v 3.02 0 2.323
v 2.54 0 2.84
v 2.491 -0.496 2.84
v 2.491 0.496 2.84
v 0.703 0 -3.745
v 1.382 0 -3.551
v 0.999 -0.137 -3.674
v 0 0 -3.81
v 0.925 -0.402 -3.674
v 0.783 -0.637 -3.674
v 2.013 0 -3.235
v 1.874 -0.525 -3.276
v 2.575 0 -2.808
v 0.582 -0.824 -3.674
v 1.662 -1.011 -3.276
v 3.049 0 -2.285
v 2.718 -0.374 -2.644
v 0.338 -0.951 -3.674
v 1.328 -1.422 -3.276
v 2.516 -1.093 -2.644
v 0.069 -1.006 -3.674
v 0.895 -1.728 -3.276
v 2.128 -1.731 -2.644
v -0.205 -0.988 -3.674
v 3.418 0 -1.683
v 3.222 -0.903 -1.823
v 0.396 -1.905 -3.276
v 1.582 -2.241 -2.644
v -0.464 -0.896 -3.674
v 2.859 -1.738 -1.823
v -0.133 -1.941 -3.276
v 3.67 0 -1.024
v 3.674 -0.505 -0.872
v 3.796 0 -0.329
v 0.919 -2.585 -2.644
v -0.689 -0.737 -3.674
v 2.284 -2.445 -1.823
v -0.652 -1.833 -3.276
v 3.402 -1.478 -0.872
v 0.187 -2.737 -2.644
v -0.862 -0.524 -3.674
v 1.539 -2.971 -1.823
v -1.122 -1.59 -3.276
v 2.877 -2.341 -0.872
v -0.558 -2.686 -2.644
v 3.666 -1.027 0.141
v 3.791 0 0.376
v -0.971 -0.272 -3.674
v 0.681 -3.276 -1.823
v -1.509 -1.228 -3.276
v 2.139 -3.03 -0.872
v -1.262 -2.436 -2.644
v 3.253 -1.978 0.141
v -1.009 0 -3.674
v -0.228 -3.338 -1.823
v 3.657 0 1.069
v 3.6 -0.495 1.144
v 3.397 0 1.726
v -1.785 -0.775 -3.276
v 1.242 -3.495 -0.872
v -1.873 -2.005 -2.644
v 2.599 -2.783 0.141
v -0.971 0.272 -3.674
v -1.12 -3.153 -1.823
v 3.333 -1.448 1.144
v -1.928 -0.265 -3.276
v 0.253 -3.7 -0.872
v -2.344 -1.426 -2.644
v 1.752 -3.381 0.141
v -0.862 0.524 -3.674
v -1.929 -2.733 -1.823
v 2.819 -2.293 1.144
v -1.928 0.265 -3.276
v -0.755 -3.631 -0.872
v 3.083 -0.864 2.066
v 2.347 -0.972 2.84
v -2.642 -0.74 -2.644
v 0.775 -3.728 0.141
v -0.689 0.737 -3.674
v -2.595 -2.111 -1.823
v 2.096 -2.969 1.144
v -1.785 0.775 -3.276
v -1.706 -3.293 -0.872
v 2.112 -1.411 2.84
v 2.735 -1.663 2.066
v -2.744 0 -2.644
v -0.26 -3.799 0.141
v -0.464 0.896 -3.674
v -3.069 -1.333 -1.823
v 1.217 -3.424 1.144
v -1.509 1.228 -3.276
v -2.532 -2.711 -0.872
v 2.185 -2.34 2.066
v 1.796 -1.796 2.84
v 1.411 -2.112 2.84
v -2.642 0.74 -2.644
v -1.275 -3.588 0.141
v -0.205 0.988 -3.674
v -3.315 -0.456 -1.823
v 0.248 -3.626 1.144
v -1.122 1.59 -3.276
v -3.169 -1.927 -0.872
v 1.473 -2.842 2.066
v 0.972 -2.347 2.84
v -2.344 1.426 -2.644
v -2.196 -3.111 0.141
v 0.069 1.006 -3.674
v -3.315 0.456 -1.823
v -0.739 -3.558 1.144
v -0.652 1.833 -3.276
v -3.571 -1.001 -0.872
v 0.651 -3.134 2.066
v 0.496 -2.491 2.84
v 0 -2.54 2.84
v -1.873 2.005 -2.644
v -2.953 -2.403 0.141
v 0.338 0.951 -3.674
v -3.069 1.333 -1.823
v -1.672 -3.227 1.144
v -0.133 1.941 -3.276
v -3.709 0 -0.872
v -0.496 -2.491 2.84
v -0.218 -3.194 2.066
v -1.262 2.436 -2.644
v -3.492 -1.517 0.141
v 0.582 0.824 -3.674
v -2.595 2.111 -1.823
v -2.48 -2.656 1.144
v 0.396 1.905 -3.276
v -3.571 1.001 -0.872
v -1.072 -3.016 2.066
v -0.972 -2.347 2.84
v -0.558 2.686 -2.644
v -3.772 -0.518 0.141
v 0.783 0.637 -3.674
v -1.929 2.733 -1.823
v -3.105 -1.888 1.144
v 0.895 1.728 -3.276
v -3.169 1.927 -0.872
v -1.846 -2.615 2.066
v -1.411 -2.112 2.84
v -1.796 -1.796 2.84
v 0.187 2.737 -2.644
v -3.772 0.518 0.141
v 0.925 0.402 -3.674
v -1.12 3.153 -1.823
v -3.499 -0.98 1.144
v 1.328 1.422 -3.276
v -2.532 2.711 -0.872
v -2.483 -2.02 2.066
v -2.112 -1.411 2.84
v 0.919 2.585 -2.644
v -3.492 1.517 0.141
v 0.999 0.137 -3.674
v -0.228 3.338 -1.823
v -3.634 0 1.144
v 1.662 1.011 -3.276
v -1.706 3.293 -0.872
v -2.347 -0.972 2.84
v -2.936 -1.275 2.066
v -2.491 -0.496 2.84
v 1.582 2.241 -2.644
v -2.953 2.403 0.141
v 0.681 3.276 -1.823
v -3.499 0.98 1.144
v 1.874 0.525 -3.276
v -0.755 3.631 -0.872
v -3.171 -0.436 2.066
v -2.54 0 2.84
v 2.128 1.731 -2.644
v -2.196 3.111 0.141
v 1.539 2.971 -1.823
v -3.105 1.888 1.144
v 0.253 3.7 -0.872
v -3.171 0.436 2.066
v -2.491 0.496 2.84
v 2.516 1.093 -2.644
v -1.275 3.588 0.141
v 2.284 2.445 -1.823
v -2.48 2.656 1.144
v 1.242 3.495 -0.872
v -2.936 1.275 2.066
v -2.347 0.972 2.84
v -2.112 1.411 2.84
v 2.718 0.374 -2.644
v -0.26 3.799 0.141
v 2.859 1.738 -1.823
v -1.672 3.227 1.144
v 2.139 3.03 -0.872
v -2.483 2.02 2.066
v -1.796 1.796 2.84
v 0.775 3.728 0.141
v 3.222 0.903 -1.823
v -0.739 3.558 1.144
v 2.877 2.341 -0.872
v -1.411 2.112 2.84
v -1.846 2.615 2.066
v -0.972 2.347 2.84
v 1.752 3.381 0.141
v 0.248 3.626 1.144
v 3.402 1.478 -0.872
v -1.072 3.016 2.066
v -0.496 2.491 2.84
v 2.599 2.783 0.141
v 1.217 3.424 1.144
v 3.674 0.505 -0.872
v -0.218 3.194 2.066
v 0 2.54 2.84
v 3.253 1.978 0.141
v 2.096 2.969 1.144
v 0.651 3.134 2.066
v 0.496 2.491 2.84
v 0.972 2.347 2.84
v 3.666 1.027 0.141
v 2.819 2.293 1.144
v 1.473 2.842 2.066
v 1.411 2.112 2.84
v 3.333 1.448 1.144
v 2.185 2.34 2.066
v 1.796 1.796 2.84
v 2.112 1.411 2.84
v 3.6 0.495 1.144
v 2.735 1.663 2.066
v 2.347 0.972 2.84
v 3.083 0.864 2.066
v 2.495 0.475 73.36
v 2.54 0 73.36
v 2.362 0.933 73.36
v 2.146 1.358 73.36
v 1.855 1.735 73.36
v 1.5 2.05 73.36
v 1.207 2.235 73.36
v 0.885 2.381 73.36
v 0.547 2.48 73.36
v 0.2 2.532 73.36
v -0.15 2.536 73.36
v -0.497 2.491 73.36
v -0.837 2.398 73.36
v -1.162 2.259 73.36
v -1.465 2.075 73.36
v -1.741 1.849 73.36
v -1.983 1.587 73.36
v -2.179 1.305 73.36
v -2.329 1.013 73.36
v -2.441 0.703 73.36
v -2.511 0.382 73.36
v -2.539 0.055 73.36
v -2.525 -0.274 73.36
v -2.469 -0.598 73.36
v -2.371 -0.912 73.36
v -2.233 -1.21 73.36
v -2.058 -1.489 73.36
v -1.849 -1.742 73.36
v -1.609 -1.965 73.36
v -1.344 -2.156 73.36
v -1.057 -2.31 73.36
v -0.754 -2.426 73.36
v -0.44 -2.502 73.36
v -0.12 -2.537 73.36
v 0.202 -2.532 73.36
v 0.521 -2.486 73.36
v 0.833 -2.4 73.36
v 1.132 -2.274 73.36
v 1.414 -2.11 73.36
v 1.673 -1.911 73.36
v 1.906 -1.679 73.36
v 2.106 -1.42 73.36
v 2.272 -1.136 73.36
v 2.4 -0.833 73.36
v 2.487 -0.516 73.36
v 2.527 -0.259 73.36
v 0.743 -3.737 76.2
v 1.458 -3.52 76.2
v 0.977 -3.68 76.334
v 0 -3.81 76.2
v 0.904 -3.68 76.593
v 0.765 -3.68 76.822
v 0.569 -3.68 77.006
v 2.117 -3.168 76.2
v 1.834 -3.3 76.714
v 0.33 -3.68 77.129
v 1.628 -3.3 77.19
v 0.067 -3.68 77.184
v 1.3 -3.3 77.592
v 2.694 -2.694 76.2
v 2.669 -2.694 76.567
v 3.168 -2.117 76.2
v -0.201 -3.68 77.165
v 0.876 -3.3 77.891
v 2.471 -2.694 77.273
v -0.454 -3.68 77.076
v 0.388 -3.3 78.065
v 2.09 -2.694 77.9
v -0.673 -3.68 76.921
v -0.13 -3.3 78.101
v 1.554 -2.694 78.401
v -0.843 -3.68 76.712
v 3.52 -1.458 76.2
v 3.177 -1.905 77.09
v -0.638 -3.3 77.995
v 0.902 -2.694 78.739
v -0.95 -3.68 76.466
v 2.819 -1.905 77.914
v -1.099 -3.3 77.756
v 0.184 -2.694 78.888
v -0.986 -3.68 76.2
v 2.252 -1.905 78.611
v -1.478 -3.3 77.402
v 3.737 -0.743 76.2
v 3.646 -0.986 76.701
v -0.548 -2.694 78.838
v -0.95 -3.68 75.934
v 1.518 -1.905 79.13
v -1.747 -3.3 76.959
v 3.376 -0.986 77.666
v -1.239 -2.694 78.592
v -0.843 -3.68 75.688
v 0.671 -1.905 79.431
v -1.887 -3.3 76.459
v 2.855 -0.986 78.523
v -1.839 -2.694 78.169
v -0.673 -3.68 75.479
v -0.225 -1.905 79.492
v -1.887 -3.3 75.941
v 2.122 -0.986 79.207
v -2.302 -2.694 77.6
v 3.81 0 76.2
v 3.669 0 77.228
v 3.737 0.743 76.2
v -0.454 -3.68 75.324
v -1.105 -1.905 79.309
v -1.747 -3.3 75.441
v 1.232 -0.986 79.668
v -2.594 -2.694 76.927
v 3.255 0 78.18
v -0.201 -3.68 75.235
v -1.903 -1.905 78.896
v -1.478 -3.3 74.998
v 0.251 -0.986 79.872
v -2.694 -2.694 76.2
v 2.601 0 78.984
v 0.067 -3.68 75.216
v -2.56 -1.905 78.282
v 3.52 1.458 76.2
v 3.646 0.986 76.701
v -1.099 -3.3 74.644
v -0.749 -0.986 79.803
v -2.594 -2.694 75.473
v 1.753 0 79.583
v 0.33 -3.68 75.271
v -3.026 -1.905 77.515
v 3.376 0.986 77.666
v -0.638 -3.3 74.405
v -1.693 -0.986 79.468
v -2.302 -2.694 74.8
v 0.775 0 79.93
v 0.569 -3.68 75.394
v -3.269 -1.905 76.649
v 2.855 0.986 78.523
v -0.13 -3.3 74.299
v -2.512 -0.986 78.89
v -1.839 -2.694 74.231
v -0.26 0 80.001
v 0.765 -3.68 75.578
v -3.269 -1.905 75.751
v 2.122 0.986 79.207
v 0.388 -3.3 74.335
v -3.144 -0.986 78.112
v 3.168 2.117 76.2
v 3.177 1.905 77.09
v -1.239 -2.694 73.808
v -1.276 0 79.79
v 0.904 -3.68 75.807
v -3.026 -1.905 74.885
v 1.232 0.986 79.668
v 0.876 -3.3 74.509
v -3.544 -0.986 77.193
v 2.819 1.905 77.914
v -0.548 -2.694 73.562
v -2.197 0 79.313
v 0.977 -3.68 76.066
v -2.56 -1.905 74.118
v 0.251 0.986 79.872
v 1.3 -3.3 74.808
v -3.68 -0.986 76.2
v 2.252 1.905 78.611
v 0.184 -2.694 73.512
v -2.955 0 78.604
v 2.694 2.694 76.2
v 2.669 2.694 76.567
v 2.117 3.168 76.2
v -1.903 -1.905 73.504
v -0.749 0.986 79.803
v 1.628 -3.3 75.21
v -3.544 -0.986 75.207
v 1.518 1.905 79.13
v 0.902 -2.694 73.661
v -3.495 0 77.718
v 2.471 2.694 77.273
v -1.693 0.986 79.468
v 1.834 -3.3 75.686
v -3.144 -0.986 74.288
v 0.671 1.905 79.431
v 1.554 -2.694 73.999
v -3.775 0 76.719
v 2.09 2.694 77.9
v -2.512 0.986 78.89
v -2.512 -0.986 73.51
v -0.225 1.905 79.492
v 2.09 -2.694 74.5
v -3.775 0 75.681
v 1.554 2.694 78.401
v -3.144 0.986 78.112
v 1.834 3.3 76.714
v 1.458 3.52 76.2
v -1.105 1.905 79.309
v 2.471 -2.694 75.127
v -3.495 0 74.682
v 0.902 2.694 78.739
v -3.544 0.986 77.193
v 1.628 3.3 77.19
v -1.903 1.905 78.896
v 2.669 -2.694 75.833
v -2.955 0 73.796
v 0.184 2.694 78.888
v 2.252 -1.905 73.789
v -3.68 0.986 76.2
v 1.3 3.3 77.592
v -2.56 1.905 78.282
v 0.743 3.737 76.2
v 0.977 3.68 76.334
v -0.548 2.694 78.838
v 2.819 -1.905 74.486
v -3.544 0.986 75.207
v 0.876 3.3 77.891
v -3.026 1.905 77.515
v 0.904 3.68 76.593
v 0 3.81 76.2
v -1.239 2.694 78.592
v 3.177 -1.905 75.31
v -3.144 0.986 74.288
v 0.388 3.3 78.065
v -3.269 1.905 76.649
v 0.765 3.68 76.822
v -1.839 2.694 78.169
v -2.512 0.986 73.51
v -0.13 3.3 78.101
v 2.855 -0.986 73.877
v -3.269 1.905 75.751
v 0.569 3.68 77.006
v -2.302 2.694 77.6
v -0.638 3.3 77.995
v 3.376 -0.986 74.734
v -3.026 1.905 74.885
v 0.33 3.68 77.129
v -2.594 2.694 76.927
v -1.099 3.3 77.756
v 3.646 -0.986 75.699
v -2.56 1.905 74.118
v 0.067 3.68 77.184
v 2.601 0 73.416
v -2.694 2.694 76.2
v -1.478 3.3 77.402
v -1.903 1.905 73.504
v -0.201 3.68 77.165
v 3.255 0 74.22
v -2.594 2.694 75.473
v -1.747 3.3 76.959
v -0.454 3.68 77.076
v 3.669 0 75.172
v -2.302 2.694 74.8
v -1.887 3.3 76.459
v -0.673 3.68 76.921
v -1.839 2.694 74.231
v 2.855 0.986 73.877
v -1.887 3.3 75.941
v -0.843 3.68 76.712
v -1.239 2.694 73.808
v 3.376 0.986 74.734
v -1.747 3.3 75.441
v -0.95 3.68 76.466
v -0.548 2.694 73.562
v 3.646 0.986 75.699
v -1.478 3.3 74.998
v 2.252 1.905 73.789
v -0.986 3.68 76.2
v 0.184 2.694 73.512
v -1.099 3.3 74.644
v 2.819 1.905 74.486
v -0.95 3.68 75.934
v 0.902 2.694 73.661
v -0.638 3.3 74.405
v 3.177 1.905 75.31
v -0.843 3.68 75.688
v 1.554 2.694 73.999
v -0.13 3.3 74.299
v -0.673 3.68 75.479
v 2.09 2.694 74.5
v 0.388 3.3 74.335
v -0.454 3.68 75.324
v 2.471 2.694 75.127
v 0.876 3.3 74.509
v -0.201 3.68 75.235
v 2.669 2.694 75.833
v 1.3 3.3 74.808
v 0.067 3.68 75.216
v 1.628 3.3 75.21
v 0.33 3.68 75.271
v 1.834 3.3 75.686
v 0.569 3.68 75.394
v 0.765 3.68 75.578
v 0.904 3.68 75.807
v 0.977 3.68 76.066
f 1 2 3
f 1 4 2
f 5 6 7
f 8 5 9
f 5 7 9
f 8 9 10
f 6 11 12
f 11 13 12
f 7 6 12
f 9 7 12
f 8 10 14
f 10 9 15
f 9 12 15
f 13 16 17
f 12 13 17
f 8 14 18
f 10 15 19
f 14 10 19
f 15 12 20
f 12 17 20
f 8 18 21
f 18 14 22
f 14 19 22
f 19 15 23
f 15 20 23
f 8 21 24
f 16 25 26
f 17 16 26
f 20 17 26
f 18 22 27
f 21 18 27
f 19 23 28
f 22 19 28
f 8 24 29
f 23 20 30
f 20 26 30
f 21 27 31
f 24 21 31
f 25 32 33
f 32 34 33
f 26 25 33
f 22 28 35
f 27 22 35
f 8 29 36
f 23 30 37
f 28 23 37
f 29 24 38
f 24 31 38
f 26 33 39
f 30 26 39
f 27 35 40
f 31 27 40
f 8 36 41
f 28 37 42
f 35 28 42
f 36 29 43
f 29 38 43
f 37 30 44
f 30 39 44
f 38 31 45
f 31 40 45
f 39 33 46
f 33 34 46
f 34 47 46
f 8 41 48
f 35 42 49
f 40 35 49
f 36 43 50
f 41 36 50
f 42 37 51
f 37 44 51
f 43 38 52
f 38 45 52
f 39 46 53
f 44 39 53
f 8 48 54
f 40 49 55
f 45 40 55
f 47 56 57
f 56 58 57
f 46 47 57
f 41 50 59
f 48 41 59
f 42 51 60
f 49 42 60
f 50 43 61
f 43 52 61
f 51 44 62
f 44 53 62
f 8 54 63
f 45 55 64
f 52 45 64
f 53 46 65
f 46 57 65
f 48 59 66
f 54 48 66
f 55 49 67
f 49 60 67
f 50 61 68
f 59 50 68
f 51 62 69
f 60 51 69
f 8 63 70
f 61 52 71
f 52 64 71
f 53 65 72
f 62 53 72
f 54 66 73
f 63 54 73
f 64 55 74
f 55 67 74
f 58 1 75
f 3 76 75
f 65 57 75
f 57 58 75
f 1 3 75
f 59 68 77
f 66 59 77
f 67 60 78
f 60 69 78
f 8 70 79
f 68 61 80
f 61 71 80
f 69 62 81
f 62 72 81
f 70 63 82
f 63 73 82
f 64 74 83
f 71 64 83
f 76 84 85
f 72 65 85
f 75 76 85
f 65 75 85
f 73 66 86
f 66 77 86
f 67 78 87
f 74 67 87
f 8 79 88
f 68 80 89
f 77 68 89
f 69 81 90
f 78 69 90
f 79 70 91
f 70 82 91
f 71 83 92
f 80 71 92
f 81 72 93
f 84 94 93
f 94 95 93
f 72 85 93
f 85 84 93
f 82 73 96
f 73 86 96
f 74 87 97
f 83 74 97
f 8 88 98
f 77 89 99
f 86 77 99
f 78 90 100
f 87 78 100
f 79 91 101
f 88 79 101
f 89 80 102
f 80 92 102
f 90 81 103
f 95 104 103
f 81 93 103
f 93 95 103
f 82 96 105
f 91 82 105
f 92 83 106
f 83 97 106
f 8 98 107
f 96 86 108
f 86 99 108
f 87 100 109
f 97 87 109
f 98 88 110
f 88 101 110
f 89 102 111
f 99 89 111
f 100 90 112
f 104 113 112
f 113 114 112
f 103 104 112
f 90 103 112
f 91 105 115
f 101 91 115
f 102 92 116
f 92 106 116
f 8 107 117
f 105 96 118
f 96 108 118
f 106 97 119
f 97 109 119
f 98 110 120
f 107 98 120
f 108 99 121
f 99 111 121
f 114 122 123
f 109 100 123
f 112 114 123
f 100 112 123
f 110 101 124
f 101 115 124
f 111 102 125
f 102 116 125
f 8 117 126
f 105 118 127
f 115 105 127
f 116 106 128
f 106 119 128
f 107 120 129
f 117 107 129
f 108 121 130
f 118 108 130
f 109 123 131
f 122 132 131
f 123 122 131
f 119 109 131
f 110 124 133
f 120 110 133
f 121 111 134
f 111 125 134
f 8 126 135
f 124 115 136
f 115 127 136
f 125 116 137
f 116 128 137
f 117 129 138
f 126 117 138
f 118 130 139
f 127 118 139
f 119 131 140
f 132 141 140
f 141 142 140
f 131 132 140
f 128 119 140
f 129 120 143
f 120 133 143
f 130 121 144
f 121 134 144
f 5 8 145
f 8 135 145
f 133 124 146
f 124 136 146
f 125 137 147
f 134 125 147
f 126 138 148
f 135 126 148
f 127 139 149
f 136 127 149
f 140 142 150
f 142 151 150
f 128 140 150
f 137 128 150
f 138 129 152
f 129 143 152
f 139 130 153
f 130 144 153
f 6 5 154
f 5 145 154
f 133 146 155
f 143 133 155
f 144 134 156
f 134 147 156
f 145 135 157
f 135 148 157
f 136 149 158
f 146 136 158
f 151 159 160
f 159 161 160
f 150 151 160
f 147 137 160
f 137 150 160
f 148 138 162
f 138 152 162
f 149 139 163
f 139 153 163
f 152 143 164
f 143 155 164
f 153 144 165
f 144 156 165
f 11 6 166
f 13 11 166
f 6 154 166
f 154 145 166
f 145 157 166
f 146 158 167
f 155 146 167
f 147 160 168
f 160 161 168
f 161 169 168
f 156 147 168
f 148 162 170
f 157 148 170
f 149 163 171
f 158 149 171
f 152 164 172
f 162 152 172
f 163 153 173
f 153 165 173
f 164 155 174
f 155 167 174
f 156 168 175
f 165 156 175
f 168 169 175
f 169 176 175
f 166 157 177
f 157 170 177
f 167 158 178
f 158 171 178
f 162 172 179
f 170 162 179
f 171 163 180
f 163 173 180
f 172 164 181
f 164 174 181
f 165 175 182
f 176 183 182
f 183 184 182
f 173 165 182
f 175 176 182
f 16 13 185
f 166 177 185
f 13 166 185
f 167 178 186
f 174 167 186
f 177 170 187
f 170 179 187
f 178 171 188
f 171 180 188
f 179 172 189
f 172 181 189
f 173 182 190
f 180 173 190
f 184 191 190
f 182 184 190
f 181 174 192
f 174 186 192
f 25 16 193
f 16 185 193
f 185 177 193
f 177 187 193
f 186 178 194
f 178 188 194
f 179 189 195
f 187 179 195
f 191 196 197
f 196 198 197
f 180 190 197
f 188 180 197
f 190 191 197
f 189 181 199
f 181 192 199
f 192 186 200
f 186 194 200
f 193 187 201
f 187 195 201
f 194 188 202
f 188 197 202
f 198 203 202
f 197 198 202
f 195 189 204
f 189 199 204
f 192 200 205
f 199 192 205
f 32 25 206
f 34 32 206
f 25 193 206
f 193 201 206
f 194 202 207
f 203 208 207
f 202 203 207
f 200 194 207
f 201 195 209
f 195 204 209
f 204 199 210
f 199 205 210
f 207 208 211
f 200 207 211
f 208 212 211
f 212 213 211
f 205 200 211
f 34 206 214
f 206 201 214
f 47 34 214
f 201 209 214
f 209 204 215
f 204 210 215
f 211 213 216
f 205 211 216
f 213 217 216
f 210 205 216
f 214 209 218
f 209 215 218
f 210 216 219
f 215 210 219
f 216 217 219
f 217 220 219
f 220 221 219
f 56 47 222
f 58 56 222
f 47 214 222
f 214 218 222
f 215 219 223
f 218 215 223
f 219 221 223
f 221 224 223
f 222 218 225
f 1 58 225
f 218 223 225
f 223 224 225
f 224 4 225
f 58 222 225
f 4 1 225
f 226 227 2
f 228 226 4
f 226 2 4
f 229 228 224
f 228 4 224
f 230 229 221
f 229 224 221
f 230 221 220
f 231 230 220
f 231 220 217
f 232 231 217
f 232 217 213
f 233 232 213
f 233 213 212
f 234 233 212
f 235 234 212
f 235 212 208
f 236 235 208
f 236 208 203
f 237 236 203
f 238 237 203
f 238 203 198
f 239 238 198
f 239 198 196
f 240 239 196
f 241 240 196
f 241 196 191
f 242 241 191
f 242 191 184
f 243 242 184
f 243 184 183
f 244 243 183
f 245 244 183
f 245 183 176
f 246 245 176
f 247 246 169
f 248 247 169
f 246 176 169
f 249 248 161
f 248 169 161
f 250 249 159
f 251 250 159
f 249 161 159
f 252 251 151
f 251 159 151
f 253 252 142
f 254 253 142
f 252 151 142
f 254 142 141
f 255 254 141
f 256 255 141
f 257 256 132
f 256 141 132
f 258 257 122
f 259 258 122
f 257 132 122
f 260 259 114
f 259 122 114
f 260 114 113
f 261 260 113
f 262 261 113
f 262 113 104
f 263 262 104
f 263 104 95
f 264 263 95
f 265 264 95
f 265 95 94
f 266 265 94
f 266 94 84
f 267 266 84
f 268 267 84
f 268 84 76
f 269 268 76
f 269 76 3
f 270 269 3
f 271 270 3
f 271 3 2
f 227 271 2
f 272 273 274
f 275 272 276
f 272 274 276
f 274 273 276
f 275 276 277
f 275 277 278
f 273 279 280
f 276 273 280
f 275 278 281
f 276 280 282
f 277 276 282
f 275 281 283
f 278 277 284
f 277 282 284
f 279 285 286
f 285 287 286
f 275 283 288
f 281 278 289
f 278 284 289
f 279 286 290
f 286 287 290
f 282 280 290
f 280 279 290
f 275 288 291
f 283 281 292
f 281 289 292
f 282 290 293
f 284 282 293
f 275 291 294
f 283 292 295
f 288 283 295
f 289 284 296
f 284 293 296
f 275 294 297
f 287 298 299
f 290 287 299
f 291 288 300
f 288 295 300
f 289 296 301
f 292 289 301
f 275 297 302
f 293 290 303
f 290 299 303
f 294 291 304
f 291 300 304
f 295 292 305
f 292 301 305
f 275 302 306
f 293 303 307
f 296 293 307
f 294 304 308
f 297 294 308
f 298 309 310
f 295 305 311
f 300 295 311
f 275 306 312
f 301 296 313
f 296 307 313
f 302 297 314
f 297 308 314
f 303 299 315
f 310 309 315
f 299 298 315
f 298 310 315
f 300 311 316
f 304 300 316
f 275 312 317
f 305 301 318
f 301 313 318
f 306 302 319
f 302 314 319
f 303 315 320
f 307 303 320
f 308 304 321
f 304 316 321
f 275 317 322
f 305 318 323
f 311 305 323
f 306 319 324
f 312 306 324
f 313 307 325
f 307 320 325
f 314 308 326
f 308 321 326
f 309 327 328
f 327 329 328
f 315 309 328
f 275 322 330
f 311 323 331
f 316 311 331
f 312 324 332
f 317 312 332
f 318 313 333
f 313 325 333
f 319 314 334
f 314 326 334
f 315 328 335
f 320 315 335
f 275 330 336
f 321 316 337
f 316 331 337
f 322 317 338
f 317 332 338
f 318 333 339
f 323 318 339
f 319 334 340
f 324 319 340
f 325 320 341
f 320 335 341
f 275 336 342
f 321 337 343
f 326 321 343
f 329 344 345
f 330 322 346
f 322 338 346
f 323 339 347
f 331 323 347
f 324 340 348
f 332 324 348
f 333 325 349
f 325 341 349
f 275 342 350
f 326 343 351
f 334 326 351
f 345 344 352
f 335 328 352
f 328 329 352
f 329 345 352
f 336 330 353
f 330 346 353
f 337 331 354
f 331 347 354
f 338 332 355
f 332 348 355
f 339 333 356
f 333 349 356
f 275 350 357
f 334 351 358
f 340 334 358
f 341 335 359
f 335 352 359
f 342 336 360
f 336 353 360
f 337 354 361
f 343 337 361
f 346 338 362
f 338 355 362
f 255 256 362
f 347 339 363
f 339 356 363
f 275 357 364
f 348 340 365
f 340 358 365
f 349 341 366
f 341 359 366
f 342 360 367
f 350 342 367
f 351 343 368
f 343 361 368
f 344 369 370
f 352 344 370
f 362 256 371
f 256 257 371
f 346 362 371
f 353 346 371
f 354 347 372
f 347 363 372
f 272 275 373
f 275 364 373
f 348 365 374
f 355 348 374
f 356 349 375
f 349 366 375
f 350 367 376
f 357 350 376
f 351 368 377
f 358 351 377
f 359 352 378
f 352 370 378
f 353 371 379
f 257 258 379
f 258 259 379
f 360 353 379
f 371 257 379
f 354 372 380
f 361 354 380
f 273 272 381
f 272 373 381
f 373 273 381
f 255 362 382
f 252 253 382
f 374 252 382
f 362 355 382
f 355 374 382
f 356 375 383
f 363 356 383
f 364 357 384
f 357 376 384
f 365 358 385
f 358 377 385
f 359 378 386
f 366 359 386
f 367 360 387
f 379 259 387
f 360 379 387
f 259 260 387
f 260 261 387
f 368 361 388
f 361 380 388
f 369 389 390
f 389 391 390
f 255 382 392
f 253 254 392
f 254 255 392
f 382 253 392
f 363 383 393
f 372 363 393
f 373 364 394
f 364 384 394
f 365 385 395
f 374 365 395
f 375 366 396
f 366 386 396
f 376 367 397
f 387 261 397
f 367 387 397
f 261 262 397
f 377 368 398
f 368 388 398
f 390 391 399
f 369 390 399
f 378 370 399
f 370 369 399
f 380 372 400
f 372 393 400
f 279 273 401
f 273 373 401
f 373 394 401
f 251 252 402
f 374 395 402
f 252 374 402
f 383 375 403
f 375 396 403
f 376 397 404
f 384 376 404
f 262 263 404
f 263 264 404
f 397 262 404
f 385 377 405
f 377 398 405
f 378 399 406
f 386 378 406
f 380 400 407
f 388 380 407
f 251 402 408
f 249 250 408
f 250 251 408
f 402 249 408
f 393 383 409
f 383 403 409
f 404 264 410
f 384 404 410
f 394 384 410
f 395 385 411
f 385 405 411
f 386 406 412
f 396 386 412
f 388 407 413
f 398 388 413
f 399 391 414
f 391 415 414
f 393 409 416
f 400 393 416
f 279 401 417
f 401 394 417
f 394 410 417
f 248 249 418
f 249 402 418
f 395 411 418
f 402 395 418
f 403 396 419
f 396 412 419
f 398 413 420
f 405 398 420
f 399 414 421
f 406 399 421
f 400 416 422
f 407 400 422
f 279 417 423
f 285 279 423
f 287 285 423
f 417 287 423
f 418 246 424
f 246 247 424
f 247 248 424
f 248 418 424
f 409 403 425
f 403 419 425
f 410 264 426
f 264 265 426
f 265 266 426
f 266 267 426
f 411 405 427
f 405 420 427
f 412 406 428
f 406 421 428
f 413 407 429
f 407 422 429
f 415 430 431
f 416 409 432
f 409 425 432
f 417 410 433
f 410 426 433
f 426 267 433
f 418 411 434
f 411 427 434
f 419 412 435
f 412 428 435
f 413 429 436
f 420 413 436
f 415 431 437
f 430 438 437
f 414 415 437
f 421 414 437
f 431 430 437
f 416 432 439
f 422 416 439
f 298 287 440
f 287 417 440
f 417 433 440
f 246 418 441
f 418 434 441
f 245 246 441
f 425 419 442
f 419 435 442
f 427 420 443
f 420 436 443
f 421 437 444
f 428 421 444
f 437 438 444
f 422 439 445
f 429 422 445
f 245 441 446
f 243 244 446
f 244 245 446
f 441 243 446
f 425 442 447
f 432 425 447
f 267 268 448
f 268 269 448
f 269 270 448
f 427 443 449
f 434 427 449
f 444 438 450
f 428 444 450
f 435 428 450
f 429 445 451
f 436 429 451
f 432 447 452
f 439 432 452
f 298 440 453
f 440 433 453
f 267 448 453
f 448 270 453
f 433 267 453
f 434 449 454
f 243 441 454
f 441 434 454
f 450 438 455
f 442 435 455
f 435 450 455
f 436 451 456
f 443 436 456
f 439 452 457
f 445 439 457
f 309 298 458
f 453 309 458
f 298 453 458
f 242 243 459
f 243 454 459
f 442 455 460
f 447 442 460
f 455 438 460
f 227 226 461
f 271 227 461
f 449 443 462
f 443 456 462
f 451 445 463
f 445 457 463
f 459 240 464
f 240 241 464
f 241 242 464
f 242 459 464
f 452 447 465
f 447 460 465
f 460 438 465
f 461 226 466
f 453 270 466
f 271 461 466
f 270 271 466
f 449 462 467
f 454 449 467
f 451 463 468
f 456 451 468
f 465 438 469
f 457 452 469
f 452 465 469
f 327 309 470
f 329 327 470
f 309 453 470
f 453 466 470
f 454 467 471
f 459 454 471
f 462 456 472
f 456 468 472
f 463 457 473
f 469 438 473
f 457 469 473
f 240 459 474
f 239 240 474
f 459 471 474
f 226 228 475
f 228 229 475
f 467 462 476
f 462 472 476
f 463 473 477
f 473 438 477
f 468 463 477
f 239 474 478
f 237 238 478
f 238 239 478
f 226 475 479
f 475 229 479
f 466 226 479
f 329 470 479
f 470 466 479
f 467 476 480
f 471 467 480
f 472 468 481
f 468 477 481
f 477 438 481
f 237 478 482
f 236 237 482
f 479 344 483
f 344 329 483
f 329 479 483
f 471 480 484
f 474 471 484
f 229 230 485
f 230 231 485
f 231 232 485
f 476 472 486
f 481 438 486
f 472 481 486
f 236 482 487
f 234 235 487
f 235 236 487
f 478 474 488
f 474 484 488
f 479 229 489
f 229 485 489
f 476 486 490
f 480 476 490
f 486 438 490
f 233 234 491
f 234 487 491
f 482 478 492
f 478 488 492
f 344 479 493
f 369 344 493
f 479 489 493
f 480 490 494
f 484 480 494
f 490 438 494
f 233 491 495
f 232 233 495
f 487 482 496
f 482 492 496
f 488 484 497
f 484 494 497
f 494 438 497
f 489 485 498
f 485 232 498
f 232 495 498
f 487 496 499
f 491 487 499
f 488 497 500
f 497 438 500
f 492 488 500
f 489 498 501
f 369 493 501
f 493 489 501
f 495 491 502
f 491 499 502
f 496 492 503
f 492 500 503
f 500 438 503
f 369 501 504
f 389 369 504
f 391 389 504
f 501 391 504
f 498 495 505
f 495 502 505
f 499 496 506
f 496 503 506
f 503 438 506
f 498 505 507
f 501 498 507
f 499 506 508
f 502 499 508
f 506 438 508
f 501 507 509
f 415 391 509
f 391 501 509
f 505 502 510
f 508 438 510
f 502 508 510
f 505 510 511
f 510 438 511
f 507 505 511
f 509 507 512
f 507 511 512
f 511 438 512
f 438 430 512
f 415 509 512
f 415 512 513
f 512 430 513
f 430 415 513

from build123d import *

# Parameters (mm, degrees)
F2_R     = 2.54
F3_DEPTH = 76.2


with BuildPart() as f1:
    # F0 (on Front) → F1 (revolve)
    with BuildSketch(Plane.XZ):
        with BuildLine():
            Line((0, 3.81), (0, -3.81))
            ThreePointArc((0, -3.81), (3.81, 0), (0, 3.81))
        make_face()
    revolve(axis=Axis((0, 0, 0), (0, 0, -1)))

    # F2 (on Top) → F3 (join)
    with BuildSketch(Plane.XY):
        Circle(F2_R)
    extrude(amount=F3_DEPTH)

    # F4 (on face) → F5 (revolve)
    with BuildSketch(Plane.XY.offset(76.2)):
        with BuildLine():
            Line((0, -2.54), (0, -3.81))
            ThreePointArc((0, -3.81), (3.81, 0), (0, 3.81))
            Line((0, 3.81), (0, 2.54))
            ThreePointArc((0, 2.54), (1.7960512242, 1.7960512242), (2.54, 0))
            ThreePointArc((2.54, 0), (1.7960512242, -1.7960512242), (0, -2.54))
        make_face()
        with BuildLine():
            Line((0, 2.54), (0, -2.54))
            ThreePointArc((0, -2.54), (1.7960512242, -1.7960512242), (2.54, 0))
            ThreePointArc((2.54, 0), (1.7960512242, 1.7960512242), (0, 2.54))
        make_face()
    revolve(axis=Axis((0, 0, 76.2), (0, -1, 0)))


solid = f1.part
